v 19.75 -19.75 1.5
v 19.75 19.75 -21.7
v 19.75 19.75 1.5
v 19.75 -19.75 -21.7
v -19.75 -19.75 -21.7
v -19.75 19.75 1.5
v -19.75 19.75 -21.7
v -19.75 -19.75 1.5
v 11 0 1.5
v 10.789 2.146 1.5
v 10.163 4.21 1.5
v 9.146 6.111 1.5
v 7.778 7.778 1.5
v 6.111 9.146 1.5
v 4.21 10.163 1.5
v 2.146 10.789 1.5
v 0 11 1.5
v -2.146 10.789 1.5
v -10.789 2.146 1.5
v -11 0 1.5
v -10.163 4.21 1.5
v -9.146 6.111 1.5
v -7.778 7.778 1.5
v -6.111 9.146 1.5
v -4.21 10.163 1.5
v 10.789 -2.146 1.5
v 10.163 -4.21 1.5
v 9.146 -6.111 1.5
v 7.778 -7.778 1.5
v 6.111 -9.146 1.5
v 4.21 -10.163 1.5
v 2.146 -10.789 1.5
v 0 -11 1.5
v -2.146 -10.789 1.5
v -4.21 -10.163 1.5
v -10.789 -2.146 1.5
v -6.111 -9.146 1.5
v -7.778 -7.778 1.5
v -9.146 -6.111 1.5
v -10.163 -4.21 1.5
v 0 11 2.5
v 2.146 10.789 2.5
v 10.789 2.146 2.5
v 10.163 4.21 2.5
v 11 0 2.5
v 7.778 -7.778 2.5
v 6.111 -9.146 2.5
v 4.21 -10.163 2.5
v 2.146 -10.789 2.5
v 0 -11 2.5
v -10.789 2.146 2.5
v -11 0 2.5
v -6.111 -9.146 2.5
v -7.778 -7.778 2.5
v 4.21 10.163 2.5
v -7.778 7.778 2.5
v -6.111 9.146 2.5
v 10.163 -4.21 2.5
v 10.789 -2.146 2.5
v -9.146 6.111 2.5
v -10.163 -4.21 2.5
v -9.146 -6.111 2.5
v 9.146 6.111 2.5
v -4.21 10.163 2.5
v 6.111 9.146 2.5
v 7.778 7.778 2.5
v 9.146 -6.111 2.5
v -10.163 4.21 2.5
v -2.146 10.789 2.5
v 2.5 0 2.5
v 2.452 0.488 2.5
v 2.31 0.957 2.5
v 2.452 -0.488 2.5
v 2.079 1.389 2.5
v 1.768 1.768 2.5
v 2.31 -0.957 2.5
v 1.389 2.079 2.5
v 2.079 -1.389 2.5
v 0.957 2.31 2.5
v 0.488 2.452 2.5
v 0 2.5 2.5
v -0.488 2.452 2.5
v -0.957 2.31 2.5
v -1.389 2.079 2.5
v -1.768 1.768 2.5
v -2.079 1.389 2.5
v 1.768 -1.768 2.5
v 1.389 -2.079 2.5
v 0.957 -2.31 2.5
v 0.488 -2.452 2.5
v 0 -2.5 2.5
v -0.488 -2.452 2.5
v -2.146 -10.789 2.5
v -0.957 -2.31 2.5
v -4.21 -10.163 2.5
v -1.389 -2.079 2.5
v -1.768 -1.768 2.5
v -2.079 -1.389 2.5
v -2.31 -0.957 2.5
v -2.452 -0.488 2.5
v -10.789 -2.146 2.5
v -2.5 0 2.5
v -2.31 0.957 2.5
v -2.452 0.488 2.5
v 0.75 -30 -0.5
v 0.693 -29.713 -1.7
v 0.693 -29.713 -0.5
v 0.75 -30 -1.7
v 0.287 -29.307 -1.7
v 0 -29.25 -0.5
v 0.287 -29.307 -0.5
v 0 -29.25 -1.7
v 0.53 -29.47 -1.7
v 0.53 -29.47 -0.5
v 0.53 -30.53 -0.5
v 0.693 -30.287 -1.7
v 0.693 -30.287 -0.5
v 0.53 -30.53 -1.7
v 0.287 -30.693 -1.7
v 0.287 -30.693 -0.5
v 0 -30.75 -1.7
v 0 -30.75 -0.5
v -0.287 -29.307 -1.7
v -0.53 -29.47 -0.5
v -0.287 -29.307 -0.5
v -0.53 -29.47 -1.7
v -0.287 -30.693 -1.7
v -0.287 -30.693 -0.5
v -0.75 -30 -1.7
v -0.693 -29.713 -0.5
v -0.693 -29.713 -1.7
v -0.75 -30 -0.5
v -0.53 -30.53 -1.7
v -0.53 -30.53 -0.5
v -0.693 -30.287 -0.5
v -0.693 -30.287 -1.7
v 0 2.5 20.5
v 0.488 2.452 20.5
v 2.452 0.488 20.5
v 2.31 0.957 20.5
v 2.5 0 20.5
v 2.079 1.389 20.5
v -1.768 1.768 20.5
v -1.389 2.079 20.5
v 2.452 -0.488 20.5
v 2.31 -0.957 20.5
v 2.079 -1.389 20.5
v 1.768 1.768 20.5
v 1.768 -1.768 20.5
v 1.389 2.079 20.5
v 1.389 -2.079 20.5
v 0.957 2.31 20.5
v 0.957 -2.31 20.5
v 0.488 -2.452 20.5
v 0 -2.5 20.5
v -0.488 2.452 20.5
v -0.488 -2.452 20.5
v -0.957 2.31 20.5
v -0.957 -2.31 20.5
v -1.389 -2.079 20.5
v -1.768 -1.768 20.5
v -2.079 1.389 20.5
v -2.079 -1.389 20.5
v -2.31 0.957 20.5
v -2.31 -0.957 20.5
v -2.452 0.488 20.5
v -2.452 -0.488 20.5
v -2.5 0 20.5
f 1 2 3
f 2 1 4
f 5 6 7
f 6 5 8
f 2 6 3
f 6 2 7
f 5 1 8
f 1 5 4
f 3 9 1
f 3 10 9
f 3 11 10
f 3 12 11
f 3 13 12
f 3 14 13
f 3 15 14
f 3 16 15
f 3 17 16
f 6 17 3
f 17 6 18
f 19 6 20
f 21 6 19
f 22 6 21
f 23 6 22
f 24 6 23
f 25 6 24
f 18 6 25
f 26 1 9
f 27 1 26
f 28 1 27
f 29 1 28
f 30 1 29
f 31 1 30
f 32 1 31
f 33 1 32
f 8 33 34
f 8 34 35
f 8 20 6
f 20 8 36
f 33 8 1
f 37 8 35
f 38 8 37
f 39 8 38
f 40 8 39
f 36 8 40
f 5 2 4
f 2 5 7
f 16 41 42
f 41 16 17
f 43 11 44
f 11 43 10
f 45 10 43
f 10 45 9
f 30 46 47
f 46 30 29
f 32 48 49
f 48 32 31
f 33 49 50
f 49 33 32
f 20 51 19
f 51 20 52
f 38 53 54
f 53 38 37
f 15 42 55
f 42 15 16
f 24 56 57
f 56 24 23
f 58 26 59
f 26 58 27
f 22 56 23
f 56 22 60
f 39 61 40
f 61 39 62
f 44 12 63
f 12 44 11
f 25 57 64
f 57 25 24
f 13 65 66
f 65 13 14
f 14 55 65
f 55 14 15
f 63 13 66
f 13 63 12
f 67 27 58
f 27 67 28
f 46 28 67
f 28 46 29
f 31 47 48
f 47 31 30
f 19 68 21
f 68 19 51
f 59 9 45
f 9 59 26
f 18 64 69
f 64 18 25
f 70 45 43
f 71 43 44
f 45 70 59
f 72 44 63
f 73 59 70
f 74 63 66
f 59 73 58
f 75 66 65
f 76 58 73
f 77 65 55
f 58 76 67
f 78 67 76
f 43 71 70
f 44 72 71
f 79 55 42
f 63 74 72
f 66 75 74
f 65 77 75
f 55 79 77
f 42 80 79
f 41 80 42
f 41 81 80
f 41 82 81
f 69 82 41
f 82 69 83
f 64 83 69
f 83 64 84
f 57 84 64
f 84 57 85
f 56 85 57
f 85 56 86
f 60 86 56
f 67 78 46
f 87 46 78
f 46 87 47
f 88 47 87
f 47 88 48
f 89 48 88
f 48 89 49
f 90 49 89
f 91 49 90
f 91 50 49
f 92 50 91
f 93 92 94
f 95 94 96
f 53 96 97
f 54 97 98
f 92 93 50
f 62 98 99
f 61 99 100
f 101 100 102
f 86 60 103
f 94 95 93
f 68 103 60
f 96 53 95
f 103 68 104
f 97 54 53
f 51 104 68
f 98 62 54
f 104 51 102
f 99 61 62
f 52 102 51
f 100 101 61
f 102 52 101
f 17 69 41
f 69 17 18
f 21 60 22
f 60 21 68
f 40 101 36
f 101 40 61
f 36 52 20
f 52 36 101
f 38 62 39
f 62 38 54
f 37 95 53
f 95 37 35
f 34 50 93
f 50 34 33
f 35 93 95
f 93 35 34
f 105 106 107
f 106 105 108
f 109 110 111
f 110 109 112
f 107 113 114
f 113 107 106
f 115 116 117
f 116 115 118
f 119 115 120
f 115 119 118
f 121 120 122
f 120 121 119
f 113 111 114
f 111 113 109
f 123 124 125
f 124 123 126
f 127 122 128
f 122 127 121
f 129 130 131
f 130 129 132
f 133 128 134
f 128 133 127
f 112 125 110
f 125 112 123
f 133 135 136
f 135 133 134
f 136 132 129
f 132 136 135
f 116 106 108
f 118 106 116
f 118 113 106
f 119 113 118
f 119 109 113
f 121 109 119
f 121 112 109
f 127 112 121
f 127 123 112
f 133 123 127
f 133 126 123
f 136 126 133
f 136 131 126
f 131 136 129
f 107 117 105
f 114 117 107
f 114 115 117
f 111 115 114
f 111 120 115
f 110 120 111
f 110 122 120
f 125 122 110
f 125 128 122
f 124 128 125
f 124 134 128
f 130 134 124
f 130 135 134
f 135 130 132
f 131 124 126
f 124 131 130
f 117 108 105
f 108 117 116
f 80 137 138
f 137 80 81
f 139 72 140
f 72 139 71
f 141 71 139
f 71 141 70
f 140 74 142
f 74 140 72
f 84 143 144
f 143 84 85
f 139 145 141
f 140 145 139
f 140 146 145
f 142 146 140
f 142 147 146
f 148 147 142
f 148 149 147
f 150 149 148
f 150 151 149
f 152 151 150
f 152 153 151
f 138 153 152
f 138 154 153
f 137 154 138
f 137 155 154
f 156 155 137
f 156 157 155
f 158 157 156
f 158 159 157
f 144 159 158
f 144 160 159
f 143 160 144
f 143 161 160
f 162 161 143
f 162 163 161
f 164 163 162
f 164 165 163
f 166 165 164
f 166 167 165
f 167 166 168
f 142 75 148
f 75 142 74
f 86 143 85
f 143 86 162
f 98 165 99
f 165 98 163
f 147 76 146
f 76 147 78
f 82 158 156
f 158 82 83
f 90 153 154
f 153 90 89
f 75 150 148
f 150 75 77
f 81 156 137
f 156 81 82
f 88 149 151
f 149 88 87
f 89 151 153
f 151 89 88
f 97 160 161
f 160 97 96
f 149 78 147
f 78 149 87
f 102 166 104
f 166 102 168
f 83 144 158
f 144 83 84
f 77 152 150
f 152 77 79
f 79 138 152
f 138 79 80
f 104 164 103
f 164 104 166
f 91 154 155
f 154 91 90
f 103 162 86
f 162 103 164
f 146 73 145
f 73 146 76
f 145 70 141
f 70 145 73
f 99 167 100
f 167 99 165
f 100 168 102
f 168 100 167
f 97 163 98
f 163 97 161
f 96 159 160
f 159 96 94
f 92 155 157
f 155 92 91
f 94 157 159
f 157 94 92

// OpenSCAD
// Parameters
face_width = 39.5; //[20:80:0.1]
face_thickness = 3; //[1.5:8:0.1]
body_length = 19.2; //[10:60:0.1]
body_width = 39.5; //[20:80:0.1]
body_height = 39.5; //[20:80:0.1]
rear_face_thickness = 2; //[1:6:0.1]
shaft_diameter = 5; //[2:12:0.1]
shaft_length = 20; //[5:60:0.1]
shaft_boss_diameter = 22; //[10:40:0.1]
shaft_boss_length = 2; //[1:8:0.1]
mount_hole_spacing = 31; //[15:60:0.1]
mount_hole_diameter = 3.2; //[2:8:0.1]
mount_hole_depth = 6; //[2:20:0.1]
overlap = 1; //[0.5:2:0.1]
ref_marker_diameter = 1.5; //[0.5:5:0.1]
ref_marker_length = 1.2; //[0.5:5:0.1]
ttrack_length = 60; //[20:200:1]
ttrack_pitch = 20; //[5:50:0.5]
ttrack_insert_hole_count = 3; //[1:10:1]
rail_hole_count = 2; //[1:10:1]
grill_hole_count = 4; //[1:20:1]

// Motor Shaft
module motor_shaft() {
  color("Silver") {
    translate([0, 0, face_thickness/2 + shaft_length/2 - overlap])
      cylinder(r=shaft_diameter/2, h=shaft_length, center=true, $fn=32);
  }
}

// Ttrack Hole Positions
module ttrack_hole_positions() {
  color("DimGray") {
    for (i = [1:ttrack_insert_hole_count]) {
      translate([0, ttrack_length/2 - (ttrack_length - floor(ttrack_length/ttrack_pitch)*ttrack_pitch)/2 - i*ttrack_pitch, -(face_thickness/2 + ref_marker_length/2 - overlap)])
        cylinder(r=ref_marker_diameter/2, h=ref_marker_length, center=true, $fn=16);
    }
  }
}

// Ttrack Insert Hole Positions
module ttrack_insert_hole_positions() {
  color("DimGray") {
    for (i = [1:ttrack_insert_hole_count]) {
      translate([ttrack_length/2 - i*(ttrack_length/(ttrack_insert_hole_count+1)), 0, -(face_thickness/2 + ref_marker_length/2 - overlap)])
        cylinder(r=ref_marker_diameter/2, h=ref_marker_length, center=true, $fn=16);
    }
  }
}

// Rail Hole Positions
module rail_hole_positions() {
  color("DimGray") {
    for (i = [1:rail_hole_count]) {
      translate([face_width/2 - ref_marker_diameter/2, face_width/2 - i*(face_width/(rail_hole_count+1)), -(face_thickness/2 + ref_marker_length/2 - overlap)])
        cylinder(r=ref_marker_diameter/2, h=ref_marker_length, center=true, $fn=16);
    }
  }
}

// Grill Hole Positions
module grill_hole_positions() {
  color("DimGray") {
    for (i = [1:grill_hole_count]) {
      translate([-face_width/2 + i*(face_width/(grill_hole_count+1)), -face_width/2 + i*(face_width/(grill_hole_count+1)), -(face_thickness/2 + ref_marker_length/2 - overlap)])
        cylinder(r=ref_marker_diameter/2, h=ref_marker_length, center=true, $fn=16);
    }
  }
}

// Assembly
module assembly() {
  color("Black") {
    // Motor Body
    translate([0, 0, -(face_thickness/2 + body_length/2 - overlap)])
      cube([body_width, body_height, body_length], center=true);
    // Front Face
    translate([0, 0, 0])
      cube([face_width, face_width, face_thickness], center=true);
    // Rear Face
    translate([0, 0, -(face_thickness/2 + body_length - overlap + rear_face_thickness/2)])
      cube([body_width, body_height, rear_face_thickness], center=true);
    // Shaft Boss
    translate([0, 0, face_thickness/2 + shaft_boss_length/2 - overlap])
      cylinder(r=shaft_boss_diameter/2, h=shaft_boss_length, center=true, $fn=32);
  }
  motor_shaft();
  ttrack_hole_positions();
  ttrack_insert_hole_positions();
  rail_hole_positions();
  grill_hole_positions();
  // Mounting Holes
  color("Black") {
    for (x = [-1, 1], y = [-1, 1]) {
      translate([x*mount_hole_spacing/2, y*mount_hole_spacing/2, -mount_hole_depth/2])
        cylinder(r=mount_hole_diameter/2, h=face_thickness + mount_hole_depth, center=true, $fn=16);
    }
  }
}

assembly();
